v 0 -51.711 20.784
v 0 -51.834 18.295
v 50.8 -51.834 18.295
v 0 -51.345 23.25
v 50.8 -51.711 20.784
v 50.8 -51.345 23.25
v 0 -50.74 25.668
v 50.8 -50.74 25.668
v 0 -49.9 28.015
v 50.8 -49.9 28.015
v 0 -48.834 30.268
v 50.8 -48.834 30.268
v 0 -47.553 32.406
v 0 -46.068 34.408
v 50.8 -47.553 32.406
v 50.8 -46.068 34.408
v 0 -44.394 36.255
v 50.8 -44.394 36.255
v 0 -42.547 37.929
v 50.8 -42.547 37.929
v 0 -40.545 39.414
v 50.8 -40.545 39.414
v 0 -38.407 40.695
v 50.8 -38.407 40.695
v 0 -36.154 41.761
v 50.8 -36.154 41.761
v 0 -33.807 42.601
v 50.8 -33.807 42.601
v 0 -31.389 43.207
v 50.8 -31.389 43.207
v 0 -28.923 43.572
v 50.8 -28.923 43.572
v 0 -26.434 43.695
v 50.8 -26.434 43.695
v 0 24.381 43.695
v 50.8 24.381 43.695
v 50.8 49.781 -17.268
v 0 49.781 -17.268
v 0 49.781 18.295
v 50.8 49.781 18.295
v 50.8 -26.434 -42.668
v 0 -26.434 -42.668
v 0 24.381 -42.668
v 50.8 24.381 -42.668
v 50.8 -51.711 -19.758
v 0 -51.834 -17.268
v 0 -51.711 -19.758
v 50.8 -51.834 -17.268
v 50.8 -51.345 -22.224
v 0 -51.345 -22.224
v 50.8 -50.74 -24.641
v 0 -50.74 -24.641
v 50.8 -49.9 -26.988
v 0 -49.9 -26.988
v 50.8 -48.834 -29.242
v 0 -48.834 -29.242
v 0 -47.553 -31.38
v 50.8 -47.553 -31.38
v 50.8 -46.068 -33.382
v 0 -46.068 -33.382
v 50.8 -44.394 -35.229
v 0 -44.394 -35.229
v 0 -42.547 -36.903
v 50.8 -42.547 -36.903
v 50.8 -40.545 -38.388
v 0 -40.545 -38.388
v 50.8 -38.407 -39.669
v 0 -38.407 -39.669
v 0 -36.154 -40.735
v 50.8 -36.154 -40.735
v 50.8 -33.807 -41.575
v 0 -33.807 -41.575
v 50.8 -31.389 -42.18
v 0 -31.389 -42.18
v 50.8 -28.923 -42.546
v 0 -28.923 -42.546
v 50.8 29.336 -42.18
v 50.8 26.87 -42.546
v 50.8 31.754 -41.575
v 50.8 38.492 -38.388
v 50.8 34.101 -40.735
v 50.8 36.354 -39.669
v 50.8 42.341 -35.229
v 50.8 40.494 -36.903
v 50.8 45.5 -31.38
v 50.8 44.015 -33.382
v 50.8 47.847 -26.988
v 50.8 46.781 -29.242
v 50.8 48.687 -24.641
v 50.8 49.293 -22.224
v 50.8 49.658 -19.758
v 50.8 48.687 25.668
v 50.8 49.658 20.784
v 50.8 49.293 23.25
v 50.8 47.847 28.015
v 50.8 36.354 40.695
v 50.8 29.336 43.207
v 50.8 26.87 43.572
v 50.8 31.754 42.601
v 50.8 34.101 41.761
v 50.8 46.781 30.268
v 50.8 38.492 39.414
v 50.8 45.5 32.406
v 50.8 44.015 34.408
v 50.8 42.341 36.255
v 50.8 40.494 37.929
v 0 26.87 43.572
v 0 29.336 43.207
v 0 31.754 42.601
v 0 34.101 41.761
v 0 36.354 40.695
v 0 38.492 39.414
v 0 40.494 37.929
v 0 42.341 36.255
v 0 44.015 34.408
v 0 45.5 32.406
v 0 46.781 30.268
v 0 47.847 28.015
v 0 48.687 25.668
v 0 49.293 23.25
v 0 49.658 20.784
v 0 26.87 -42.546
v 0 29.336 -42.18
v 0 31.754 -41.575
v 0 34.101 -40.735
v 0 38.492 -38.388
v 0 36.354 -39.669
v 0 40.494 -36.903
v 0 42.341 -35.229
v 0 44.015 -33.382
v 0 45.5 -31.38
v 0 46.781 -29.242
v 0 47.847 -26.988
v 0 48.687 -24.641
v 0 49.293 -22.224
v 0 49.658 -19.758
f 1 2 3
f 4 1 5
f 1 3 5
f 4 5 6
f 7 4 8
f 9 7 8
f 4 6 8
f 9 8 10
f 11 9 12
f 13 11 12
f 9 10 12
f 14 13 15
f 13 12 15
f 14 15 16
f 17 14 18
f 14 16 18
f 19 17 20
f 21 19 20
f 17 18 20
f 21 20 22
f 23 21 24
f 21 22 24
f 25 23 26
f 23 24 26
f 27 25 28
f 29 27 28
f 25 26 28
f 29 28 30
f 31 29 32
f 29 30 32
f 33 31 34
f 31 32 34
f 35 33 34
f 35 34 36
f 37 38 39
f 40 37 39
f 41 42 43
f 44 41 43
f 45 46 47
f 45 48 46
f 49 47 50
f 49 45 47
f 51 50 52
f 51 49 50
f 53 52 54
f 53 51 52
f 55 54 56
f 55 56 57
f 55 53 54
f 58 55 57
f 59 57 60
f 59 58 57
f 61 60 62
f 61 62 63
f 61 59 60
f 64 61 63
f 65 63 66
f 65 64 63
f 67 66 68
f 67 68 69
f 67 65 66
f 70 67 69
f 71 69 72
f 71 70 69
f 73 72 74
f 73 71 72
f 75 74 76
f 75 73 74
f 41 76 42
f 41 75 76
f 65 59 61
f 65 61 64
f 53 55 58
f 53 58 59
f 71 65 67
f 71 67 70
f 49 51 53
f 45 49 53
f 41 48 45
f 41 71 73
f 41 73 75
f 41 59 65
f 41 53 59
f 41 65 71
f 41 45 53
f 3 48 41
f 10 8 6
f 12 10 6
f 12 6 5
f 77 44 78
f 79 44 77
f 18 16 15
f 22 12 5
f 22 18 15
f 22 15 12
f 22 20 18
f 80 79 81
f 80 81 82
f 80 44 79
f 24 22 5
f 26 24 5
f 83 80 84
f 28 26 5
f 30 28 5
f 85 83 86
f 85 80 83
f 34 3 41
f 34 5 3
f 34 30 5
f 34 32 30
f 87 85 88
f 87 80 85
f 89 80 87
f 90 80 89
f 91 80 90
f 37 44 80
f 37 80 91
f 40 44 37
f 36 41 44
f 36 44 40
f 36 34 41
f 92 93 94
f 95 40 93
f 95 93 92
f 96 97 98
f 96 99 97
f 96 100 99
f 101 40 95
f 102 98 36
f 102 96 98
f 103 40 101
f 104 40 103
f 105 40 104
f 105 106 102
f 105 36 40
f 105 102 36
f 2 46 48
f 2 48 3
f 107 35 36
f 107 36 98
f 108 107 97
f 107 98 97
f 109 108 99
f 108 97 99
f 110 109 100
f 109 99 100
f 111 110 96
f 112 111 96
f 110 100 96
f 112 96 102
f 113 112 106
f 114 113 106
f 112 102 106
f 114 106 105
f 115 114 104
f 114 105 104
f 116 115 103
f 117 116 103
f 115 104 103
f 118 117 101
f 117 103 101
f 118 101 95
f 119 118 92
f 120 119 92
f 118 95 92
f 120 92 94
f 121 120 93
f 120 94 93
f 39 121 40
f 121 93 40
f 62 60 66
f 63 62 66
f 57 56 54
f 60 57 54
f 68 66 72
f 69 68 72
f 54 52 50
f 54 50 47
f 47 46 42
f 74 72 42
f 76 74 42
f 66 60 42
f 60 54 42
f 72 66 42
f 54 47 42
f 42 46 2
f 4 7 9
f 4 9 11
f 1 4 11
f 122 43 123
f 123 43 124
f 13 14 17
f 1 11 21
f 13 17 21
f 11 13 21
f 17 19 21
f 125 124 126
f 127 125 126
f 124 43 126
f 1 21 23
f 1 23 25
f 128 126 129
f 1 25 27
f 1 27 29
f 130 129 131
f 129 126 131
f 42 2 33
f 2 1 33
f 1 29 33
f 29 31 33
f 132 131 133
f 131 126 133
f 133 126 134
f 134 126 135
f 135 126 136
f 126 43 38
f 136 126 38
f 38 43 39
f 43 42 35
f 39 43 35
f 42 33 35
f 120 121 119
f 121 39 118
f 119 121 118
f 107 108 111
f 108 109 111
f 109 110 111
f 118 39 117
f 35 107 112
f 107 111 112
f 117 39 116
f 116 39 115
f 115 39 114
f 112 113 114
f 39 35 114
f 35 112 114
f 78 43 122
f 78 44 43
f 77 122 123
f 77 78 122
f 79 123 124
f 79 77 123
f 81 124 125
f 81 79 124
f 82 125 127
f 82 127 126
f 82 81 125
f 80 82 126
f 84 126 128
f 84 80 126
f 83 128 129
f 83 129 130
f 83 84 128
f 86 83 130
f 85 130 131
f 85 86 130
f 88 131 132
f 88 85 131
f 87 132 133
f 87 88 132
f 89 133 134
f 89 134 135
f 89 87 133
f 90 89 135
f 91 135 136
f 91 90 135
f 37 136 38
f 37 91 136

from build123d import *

# Parameters (mm, degrees)
F0_W     = 101.614196
F0_H     = 86.362857
F1_DEPTH = 50.8
F2_R     = 25.4
F3_R     = 25.4


with BuildPart() as f1:
    # F0 (on Right) → F1 (new body)
    with BuildSketch(Plane.YZ):
        with Locations((-1.026405, 0.513206)):
            Rectangle(F0_W, F0_H)
    extrude(amount=F1_DEPTH)

    # F2
    f2_edges = [f1.edges().sort_by_distance(p)[0] for p in [
        (25.4, -51.833503, 43.694634),
    ]]
    fillet(f2_edges, radius=F2_R)

    # F3
    f3_edges = [f1.edges().sort_by_distance(p)[0] for p in [
        (25.4, 49.780693, 43.694634),
        (25.4, -51.833503, -42.668223),
        (25.4, 49.780693, -42.668223),
    ]]
    fillet(f3_edges, radius=F3_R)


solid = f1.part
